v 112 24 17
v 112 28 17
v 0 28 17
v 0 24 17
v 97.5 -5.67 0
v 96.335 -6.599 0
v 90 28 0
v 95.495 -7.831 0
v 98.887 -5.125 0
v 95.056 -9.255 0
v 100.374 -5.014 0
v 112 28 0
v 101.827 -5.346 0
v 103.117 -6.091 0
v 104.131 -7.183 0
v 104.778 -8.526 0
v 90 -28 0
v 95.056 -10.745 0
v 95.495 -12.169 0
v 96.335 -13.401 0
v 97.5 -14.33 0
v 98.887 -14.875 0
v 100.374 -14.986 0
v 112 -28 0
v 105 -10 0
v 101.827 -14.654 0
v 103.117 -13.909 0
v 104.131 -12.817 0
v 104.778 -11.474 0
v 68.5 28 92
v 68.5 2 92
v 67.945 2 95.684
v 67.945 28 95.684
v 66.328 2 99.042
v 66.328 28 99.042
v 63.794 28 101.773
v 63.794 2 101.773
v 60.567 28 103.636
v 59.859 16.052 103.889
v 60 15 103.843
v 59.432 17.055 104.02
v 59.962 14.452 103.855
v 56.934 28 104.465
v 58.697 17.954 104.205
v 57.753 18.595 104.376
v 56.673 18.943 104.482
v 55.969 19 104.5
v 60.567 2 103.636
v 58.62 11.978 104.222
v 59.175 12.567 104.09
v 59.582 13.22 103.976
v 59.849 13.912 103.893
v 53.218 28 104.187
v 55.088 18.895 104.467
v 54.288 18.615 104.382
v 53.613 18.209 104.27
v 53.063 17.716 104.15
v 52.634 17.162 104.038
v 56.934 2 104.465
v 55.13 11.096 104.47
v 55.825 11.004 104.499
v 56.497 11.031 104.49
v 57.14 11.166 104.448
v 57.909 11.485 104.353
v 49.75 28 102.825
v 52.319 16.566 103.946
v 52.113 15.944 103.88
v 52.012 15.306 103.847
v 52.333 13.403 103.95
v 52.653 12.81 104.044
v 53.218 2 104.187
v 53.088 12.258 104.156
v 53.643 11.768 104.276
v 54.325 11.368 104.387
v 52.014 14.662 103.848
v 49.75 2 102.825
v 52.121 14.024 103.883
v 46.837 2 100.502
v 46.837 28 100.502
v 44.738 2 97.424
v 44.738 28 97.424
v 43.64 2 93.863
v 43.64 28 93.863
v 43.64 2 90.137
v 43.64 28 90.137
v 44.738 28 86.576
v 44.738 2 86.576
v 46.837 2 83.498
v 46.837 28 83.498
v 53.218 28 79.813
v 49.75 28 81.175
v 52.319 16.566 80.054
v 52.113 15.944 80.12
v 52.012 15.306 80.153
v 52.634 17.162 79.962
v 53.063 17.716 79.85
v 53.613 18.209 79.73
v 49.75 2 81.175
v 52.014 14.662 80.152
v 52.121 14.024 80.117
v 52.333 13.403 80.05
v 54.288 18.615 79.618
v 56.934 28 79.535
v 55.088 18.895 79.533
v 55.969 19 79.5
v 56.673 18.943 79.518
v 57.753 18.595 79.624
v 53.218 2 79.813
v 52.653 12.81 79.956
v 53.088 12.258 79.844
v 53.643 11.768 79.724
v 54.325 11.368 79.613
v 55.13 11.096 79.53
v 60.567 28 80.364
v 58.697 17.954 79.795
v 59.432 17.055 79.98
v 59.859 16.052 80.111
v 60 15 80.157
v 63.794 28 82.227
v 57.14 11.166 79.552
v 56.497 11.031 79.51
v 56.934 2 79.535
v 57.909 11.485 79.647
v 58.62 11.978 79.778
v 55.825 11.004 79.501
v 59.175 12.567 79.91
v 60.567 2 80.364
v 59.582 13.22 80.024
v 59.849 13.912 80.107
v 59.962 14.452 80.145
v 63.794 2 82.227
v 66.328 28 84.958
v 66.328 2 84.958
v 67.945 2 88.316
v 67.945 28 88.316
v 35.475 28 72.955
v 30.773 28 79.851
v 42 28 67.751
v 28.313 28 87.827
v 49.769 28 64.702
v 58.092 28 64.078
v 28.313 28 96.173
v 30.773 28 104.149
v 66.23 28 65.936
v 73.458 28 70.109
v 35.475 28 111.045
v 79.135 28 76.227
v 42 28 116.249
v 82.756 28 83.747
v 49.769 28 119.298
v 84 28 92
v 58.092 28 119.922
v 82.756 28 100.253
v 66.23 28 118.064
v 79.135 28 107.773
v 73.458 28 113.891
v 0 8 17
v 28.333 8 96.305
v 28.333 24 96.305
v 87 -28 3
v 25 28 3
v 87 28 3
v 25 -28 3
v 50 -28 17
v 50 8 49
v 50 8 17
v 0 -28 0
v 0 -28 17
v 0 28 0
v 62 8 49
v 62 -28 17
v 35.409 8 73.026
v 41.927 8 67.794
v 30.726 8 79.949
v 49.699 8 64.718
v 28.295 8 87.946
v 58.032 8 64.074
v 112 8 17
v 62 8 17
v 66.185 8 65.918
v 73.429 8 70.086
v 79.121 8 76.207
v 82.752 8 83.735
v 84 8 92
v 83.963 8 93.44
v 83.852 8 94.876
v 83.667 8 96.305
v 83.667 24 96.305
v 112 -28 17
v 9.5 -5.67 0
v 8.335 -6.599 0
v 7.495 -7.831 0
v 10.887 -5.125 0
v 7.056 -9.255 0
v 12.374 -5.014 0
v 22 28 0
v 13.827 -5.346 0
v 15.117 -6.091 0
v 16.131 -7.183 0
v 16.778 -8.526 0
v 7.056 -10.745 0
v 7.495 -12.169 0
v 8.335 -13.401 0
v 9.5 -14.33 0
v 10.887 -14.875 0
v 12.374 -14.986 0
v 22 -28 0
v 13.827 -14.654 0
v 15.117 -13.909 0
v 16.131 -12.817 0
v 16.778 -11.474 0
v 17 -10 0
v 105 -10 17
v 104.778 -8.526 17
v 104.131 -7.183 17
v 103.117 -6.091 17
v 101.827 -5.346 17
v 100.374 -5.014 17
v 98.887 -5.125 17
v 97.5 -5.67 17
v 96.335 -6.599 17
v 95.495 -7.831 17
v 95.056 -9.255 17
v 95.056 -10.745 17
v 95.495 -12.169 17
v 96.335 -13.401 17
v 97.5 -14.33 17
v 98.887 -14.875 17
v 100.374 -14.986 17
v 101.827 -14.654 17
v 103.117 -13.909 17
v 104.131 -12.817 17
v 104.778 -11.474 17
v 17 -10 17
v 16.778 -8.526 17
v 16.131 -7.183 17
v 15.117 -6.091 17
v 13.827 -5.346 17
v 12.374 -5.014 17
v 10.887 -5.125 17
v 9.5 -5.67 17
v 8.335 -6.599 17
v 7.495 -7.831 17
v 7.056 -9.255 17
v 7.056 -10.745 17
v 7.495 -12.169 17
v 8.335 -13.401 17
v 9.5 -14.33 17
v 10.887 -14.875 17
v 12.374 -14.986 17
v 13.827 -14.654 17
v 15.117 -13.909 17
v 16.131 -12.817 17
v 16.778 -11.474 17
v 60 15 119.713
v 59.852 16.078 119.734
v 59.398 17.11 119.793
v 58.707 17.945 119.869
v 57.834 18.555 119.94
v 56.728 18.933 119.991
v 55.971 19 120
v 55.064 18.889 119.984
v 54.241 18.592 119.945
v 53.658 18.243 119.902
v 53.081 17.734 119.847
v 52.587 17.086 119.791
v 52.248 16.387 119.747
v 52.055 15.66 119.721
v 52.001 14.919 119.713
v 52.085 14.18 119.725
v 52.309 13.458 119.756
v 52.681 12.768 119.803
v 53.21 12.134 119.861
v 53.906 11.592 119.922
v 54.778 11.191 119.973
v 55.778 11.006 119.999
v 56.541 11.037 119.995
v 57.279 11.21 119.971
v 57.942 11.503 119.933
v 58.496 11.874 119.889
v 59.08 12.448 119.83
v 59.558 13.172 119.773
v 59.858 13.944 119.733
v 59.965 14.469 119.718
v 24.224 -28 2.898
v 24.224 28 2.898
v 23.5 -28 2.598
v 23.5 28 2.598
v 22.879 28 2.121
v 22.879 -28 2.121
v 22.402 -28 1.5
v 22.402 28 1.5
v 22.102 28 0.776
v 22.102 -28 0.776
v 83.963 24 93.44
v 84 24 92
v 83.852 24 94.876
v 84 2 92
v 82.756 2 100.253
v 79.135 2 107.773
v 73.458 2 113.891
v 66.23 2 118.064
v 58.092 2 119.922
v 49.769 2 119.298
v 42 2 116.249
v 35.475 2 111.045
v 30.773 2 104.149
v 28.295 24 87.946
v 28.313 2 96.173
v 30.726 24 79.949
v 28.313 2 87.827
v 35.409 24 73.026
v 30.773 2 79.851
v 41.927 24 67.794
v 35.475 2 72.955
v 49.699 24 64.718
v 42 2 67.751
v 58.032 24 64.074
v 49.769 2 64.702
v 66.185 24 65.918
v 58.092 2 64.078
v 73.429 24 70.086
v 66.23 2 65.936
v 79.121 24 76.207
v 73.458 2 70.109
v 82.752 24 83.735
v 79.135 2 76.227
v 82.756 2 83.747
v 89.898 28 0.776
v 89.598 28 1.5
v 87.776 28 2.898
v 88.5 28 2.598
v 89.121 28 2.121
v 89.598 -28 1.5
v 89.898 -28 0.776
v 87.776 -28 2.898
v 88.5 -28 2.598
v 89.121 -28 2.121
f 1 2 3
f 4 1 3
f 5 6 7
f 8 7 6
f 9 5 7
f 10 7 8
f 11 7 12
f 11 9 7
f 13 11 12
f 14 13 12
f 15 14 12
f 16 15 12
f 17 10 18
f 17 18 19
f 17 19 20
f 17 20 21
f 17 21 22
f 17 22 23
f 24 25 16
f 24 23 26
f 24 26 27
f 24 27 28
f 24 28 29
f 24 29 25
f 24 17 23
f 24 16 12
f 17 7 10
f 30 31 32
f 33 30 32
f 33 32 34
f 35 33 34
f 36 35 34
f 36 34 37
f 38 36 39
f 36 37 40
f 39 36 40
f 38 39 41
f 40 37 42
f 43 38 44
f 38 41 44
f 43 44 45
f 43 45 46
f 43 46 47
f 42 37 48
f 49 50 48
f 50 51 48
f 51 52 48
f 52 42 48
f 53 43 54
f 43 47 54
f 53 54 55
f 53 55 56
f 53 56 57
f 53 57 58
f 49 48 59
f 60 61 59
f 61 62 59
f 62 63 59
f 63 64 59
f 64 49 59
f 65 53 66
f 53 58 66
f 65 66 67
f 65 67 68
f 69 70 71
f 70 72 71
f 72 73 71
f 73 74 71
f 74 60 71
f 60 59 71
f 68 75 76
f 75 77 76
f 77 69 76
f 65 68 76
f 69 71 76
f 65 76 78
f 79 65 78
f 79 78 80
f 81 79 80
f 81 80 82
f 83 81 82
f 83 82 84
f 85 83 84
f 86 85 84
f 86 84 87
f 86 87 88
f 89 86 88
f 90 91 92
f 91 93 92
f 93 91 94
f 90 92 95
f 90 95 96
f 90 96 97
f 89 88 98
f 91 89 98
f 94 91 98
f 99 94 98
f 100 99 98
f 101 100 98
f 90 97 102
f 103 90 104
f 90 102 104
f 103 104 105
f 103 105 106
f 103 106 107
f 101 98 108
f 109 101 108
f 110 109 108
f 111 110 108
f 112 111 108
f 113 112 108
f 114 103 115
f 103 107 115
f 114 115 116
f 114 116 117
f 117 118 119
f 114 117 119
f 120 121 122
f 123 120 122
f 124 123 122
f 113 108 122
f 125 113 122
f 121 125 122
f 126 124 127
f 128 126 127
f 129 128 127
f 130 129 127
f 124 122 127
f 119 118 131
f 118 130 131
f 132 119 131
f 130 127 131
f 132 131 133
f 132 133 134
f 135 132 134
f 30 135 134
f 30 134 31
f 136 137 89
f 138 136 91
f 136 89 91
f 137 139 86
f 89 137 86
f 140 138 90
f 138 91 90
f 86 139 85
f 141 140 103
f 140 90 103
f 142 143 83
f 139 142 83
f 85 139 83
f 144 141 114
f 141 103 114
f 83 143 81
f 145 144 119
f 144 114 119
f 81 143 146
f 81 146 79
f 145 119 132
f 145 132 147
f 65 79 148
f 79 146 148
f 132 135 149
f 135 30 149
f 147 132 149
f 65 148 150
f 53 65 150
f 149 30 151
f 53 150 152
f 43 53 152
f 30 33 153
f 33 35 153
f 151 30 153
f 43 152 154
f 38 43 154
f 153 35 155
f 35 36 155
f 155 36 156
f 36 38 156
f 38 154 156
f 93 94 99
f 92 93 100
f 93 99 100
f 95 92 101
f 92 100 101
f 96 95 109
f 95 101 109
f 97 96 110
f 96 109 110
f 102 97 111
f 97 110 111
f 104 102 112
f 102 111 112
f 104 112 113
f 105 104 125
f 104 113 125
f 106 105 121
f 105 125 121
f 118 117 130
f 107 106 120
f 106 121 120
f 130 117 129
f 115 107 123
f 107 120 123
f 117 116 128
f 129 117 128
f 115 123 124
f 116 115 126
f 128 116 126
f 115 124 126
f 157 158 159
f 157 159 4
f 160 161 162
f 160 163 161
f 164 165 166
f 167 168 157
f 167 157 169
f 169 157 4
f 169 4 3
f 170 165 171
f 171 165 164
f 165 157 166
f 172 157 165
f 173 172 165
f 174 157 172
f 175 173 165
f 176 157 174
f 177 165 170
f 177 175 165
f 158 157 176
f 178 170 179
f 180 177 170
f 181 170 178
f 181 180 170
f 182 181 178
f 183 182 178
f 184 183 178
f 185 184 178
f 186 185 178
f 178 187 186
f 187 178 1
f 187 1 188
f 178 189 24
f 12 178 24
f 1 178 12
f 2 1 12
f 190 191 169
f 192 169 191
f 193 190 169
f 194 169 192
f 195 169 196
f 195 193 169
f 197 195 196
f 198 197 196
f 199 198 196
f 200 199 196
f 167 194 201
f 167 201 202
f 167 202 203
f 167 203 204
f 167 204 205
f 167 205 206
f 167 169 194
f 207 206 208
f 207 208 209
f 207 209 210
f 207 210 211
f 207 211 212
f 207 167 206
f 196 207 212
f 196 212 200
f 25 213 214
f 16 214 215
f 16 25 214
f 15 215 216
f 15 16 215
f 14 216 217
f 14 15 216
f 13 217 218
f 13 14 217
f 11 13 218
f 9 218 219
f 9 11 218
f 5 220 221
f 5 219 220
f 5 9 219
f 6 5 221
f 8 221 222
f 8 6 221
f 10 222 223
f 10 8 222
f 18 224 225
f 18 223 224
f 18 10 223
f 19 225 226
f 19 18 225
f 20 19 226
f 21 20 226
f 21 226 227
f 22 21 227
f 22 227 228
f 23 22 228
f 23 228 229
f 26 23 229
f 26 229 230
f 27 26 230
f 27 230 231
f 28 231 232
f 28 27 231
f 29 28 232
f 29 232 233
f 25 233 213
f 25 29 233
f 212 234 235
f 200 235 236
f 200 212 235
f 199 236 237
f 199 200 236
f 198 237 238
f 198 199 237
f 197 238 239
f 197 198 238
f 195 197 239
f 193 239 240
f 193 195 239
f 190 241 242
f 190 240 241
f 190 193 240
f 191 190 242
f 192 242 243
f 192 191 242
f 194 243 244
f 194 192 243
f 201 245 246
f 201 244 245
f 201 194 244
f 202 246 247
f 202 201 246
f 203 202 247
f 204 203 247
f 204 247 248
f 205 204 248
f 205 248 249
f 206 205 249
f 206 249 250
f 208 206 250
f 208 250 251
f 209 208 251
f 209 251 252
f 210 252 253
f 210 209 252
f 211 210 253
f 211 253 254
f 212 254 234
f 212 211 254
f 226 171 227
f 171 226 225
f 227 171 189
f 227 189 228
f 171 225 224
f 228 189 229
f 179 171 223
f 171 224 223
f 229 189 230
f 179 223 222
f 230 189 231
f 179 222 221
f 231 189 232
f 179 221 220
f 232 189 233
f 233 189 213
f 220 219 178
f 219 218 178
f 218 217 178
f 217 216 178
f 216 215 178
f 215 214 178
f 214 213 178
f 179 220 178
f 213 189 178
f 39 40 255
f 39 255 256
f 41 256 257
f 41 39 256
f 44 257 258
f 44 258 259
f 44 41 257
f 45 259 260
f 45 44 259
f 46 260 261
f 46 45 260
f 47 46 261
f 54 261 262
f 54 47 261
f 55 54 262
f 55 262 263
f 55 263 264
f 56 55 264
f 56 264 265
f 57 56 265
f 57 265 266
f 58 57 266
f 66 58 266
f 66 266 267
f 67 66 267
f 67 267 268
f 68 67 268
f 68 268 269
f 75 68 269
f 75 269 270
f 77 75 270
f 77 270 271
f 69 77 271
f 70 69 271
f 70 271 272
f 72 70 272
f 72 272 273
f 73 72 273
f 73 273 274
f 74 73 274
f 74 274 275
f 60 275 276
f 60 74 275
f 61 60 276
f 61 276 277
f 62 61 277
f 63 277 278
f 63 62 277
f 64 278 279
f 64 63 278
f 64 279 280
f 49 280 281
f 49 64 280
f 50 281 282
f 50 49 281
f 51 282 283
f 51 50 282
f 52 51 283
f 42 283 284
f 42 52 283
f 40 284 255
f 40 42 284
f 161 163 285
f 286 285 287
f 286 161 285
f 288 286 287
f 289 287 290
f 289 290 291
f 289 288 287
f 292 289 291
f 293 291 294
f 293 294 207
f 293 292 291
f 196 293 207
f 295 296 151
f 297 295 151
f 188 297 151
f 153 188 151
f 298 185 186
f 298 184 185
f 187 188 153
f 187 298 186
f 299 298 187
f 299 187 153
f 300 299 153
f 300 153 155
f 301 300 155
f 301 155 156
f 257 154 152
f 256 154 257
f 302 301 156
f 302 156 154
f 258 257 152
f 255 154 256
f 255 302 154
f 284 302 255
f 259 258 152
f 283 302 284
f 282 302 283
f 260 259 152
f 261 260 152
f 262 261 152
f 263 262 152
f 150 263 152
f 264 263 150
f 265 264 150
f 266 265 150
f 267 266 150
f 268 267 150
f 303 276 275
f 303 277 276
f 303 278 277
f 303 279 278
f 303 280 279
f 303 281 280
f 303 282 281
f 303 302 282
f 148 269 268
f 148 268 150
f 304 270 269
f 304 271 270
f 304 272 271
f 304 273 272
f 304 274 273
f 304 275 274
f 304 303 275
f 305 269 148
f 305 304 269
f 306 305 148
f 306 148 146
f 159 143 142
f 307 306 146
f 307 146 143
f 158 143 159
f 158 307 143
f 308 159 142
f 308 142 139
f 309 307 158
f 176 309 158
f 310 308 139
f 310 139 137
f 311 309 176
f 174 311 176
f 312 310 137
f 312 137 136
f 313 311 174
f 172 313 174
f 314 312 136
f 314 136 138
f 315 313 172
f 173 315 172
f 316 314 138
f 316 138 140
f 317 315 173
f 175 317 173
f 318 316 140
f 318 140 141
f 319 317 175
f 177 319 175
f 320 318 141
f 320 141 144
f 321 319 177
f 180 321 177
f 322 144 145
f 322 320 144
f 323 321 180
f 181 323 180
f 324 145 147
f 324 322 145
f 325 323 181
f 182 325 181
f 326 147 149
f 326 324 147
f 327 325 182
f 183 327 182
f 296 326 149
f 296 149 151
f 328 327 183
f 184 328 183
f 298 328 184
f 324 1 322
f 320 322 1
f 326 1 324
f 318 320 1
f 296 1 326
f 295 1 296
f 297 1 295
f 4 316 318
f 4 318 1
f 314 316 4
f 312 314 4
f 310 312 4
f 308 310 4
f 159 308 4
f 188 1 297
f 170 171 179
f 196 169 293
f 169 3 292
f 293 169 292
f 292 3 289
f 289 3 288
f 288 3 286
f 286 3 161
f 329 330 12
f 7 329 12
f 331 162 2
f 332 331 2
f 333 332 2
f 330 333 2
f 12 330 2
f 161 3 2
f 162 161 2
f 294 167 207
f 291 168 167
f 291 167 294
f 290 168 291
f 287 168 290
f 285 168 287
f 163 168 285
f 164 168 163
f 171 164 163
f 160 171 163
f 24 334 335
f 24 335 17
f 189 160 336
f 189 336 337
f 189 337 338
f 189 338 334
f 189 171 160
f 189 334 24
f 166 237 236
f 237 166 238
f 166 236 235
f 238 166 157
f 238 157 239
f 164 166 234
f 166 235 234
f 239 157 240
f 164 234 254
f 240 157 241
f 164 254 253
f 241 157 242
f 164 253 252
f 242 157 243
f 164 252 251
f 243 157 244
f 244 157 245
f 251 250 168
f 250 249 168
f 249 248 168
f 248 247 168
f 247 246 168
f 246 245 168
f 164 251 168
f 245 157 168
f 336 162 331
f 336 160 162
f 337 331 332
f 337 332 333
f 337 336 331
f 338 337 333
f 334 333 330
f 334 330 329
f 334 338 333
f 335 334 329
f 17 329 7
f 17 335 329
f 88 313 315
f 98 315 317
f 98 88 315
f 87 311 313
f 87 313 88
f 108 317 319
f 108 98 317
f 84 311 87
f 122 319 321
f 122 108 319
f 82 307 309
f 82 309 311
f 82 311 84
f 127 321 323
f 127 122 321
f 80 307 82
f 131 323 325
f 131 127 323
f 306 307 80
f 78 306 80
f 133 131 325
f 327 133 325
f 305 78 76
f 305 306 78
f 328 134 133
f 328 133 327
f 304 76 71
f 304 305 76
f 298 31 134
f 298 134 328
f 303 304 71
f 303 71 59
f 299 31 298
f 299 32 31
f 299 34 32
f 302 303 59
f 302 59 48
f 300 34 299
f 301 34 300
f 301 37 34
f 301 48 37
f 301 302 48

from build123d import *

# Parameters (mm, degrees)
F1_DEPTH  = 28
F3_DEPTH  = 28
F5_DEPTH  = 8
F7_DEPTH  = 4
F8_R      = 28
F9_DEPTH  = 28
F10_R     = 28
F11_DEPTH = 2
F12_R     = 12.5
F13_DEPTH = 26.001
F15_DEPTH = 112
F17_DEPTH = 50
F19_DEPTH = 50
F20_R     = 4
F21_DEPTH = 139
F22_R     = 4
F23_DEPTH = 91
F24_R     = 12.5
F25_DEPTH = 26.0010001
F26_R     = 5
F27_DEPTH = 120.0010001
F28_W     = 68
F28_H     = 3
F29_DEPTH = 28.0010001
F30_R     = 2.99999


# Not quite as in the source:
# - a fillet or chamfer is up to 0.001 mm smaller than in the source, because OpenCascade refuses the exact size


with BuildPart() as f1:
    # F0 (on Front) → F1 (new body, symmetric)
    with BuildSketch(Plane.XZ):
        Polygon((0, 17), (0, 0), (22, 0), (22, 3), (90, 3), (90, 0), (112, 0), (112, 17), align=None)
    extrude(amount=F1_DEPTH, both=True)

    # F2 (on Front) → F3 (join)
    with BuildSketch(Plane.XZ):
        with BuildLine():
            Line((28.3328655167, 96.304610259), (0, 17))
            Line((0, 17), (112, 17))
            Line((112, 17), (83.6671344833, 96.304610259))
            ThreePointArc((83.6671344833, 96.304610259), (56, 64), (28.3328655167, 96.304610259))
        make_face()
    extrude(amount=-F3_DEPTH)

    # F4 (on face) → F5 (cut)
    with BuildSketch(Plane.XZ):
        with BuildLine():
            ThreePointArc((83.6671344833, 96.304610259), (56, 64), (28.3328655167, 96.304610259))
            Line((28.3328655167, 96.304610259), (0, 17))
            Line((0, 17), (112, 17))
            Line((112, 17), (83.6671344833, 96.304610259))
        make_face()
    extrude(amount=-F5_DEPTH, mode=Mode.SUBTRACT)

    # F6 (on face) → F7 (cut)
    with BuildSketch(Plane(origin=(0, 28, 0), x_dir=(-1, 0, 0), z_dir=(0, 1, 0))):
        with BuildLine():
            Line((-83.6671344833, 96.304610259), (-112, 17))
            Line((-112, 17), (0, 17))
            Line((0, 17), (-28.3328655167, 96.304610259))
            ThreePointArc((-28.3328655167, 96.304610259), (-56, 64), (-83.6671344833, 96.304610259))
        make_face()
    extrude(amount=-F7_DEPTH, mode=Mode.SUBTRACT)

    # F8 (on Front) → F9 (join)
    with BuildSketch(Plane.XZ):
        with Locations((56, 92)):
            Circle(F8_R)
    extrude(amount=-F9_DEPTH)

    # F10 (on face) → F11 (cut)
    with BuildSketch(Plane.XZ):
        with Locations((56, 92)):
            Circle(F10_R)
    extrude(amount=-F11_DEPTH, mode=Mode.SUBTRACT)

    # F12 (on face) → F13 (cut, through all)
    with BuildSketch(Plane.XZ.offset(-2)):
        with Locations((56, 92)):
            Circle(F12_R)
    extrude(amount=-F13_DEPTH, mode=Mode.SUBTRACT)

    # F14 (on Right) → F15 (join)
    with BuildSketch(Plane.YZ):
        Polygon((8, 49), (-28, 17), (8, 17), align=None)
    extrude(amount=F15_DEPTH)

    # F16 (on face) → F17 (cut)
    with BuildSketch(Plane.YZ.offset(112)):
        Polygon((8, 49), (-28, 17), (8, 17), align=None)
    extrude(amount=-F17_DEPTH, mode=Mode.SUBTRACT)

    # F18 (on face) → F19 (cut)
    with BuildSketch(Plane(origin=(0, 0, 0), x_dir=(0, -1, 0), z_dir=(-1, 0, 0))):
        Polygon((-8, 49), (-8, 17), (28, 17), align=None)
    extrude(amount=-F19_DEPTH, mode=Mode.SUBTRACT)

    # F20 (on Top) → F21 (cut)
    with BuildSketch(Plane.XY):
        with Locations((56, 15)):
            Circle(F20_R)
    extrude(amount=F21_DEPTH, mode=Mode.SUBTRACT)

    # F22 (on Top) → F23 (join)
    with BuildSketch(Plane.XY):
        with Locations((56, 15)):
            Circle(F22_R)
    extrude(amount=F23_DEPTH)

    # F24 (on face) → F25 (cut, through all)
    with BuildSketch(Plane.XZ.offset(-2)):
        with Locations((56, 92)):
            Circle(F24_R)
    extrude(amount=-F25_DEPTH, mode=Mode.SUBTRACT)

    # F26 (on Top) → F27 (cut, through all)
    with BuildSketch(Plane.XY):
        with Locations((12, -10)):
            Circle(F26_R)
        with Locations((100, -10)):
            Circle(F26_R)
    extrude(amount=F27_DEPTH, mode=Mode.SUBTRACT)

    # F28 (on Front) → F29 (cut, through all)
    with BuildSketch(Plane.XZ):
        with Locations((56, 1.5)):
            Rectangle(F28_W, F28_H)
    extrude(amount=-F29_DEPTH, mode=Mode.SUBTRACT)

    # F30 (radius 3 in the source; OpenCascade refuses exactly that, so slightly less here)
    f30_edges = [f1.edges().sort_by_distance(p)[0] for p in [
        (90, 0, 3),
        (22, 0, 3),
    ]]
    fillet(f30_edges, radius=F30_R)


solid = f1.part
